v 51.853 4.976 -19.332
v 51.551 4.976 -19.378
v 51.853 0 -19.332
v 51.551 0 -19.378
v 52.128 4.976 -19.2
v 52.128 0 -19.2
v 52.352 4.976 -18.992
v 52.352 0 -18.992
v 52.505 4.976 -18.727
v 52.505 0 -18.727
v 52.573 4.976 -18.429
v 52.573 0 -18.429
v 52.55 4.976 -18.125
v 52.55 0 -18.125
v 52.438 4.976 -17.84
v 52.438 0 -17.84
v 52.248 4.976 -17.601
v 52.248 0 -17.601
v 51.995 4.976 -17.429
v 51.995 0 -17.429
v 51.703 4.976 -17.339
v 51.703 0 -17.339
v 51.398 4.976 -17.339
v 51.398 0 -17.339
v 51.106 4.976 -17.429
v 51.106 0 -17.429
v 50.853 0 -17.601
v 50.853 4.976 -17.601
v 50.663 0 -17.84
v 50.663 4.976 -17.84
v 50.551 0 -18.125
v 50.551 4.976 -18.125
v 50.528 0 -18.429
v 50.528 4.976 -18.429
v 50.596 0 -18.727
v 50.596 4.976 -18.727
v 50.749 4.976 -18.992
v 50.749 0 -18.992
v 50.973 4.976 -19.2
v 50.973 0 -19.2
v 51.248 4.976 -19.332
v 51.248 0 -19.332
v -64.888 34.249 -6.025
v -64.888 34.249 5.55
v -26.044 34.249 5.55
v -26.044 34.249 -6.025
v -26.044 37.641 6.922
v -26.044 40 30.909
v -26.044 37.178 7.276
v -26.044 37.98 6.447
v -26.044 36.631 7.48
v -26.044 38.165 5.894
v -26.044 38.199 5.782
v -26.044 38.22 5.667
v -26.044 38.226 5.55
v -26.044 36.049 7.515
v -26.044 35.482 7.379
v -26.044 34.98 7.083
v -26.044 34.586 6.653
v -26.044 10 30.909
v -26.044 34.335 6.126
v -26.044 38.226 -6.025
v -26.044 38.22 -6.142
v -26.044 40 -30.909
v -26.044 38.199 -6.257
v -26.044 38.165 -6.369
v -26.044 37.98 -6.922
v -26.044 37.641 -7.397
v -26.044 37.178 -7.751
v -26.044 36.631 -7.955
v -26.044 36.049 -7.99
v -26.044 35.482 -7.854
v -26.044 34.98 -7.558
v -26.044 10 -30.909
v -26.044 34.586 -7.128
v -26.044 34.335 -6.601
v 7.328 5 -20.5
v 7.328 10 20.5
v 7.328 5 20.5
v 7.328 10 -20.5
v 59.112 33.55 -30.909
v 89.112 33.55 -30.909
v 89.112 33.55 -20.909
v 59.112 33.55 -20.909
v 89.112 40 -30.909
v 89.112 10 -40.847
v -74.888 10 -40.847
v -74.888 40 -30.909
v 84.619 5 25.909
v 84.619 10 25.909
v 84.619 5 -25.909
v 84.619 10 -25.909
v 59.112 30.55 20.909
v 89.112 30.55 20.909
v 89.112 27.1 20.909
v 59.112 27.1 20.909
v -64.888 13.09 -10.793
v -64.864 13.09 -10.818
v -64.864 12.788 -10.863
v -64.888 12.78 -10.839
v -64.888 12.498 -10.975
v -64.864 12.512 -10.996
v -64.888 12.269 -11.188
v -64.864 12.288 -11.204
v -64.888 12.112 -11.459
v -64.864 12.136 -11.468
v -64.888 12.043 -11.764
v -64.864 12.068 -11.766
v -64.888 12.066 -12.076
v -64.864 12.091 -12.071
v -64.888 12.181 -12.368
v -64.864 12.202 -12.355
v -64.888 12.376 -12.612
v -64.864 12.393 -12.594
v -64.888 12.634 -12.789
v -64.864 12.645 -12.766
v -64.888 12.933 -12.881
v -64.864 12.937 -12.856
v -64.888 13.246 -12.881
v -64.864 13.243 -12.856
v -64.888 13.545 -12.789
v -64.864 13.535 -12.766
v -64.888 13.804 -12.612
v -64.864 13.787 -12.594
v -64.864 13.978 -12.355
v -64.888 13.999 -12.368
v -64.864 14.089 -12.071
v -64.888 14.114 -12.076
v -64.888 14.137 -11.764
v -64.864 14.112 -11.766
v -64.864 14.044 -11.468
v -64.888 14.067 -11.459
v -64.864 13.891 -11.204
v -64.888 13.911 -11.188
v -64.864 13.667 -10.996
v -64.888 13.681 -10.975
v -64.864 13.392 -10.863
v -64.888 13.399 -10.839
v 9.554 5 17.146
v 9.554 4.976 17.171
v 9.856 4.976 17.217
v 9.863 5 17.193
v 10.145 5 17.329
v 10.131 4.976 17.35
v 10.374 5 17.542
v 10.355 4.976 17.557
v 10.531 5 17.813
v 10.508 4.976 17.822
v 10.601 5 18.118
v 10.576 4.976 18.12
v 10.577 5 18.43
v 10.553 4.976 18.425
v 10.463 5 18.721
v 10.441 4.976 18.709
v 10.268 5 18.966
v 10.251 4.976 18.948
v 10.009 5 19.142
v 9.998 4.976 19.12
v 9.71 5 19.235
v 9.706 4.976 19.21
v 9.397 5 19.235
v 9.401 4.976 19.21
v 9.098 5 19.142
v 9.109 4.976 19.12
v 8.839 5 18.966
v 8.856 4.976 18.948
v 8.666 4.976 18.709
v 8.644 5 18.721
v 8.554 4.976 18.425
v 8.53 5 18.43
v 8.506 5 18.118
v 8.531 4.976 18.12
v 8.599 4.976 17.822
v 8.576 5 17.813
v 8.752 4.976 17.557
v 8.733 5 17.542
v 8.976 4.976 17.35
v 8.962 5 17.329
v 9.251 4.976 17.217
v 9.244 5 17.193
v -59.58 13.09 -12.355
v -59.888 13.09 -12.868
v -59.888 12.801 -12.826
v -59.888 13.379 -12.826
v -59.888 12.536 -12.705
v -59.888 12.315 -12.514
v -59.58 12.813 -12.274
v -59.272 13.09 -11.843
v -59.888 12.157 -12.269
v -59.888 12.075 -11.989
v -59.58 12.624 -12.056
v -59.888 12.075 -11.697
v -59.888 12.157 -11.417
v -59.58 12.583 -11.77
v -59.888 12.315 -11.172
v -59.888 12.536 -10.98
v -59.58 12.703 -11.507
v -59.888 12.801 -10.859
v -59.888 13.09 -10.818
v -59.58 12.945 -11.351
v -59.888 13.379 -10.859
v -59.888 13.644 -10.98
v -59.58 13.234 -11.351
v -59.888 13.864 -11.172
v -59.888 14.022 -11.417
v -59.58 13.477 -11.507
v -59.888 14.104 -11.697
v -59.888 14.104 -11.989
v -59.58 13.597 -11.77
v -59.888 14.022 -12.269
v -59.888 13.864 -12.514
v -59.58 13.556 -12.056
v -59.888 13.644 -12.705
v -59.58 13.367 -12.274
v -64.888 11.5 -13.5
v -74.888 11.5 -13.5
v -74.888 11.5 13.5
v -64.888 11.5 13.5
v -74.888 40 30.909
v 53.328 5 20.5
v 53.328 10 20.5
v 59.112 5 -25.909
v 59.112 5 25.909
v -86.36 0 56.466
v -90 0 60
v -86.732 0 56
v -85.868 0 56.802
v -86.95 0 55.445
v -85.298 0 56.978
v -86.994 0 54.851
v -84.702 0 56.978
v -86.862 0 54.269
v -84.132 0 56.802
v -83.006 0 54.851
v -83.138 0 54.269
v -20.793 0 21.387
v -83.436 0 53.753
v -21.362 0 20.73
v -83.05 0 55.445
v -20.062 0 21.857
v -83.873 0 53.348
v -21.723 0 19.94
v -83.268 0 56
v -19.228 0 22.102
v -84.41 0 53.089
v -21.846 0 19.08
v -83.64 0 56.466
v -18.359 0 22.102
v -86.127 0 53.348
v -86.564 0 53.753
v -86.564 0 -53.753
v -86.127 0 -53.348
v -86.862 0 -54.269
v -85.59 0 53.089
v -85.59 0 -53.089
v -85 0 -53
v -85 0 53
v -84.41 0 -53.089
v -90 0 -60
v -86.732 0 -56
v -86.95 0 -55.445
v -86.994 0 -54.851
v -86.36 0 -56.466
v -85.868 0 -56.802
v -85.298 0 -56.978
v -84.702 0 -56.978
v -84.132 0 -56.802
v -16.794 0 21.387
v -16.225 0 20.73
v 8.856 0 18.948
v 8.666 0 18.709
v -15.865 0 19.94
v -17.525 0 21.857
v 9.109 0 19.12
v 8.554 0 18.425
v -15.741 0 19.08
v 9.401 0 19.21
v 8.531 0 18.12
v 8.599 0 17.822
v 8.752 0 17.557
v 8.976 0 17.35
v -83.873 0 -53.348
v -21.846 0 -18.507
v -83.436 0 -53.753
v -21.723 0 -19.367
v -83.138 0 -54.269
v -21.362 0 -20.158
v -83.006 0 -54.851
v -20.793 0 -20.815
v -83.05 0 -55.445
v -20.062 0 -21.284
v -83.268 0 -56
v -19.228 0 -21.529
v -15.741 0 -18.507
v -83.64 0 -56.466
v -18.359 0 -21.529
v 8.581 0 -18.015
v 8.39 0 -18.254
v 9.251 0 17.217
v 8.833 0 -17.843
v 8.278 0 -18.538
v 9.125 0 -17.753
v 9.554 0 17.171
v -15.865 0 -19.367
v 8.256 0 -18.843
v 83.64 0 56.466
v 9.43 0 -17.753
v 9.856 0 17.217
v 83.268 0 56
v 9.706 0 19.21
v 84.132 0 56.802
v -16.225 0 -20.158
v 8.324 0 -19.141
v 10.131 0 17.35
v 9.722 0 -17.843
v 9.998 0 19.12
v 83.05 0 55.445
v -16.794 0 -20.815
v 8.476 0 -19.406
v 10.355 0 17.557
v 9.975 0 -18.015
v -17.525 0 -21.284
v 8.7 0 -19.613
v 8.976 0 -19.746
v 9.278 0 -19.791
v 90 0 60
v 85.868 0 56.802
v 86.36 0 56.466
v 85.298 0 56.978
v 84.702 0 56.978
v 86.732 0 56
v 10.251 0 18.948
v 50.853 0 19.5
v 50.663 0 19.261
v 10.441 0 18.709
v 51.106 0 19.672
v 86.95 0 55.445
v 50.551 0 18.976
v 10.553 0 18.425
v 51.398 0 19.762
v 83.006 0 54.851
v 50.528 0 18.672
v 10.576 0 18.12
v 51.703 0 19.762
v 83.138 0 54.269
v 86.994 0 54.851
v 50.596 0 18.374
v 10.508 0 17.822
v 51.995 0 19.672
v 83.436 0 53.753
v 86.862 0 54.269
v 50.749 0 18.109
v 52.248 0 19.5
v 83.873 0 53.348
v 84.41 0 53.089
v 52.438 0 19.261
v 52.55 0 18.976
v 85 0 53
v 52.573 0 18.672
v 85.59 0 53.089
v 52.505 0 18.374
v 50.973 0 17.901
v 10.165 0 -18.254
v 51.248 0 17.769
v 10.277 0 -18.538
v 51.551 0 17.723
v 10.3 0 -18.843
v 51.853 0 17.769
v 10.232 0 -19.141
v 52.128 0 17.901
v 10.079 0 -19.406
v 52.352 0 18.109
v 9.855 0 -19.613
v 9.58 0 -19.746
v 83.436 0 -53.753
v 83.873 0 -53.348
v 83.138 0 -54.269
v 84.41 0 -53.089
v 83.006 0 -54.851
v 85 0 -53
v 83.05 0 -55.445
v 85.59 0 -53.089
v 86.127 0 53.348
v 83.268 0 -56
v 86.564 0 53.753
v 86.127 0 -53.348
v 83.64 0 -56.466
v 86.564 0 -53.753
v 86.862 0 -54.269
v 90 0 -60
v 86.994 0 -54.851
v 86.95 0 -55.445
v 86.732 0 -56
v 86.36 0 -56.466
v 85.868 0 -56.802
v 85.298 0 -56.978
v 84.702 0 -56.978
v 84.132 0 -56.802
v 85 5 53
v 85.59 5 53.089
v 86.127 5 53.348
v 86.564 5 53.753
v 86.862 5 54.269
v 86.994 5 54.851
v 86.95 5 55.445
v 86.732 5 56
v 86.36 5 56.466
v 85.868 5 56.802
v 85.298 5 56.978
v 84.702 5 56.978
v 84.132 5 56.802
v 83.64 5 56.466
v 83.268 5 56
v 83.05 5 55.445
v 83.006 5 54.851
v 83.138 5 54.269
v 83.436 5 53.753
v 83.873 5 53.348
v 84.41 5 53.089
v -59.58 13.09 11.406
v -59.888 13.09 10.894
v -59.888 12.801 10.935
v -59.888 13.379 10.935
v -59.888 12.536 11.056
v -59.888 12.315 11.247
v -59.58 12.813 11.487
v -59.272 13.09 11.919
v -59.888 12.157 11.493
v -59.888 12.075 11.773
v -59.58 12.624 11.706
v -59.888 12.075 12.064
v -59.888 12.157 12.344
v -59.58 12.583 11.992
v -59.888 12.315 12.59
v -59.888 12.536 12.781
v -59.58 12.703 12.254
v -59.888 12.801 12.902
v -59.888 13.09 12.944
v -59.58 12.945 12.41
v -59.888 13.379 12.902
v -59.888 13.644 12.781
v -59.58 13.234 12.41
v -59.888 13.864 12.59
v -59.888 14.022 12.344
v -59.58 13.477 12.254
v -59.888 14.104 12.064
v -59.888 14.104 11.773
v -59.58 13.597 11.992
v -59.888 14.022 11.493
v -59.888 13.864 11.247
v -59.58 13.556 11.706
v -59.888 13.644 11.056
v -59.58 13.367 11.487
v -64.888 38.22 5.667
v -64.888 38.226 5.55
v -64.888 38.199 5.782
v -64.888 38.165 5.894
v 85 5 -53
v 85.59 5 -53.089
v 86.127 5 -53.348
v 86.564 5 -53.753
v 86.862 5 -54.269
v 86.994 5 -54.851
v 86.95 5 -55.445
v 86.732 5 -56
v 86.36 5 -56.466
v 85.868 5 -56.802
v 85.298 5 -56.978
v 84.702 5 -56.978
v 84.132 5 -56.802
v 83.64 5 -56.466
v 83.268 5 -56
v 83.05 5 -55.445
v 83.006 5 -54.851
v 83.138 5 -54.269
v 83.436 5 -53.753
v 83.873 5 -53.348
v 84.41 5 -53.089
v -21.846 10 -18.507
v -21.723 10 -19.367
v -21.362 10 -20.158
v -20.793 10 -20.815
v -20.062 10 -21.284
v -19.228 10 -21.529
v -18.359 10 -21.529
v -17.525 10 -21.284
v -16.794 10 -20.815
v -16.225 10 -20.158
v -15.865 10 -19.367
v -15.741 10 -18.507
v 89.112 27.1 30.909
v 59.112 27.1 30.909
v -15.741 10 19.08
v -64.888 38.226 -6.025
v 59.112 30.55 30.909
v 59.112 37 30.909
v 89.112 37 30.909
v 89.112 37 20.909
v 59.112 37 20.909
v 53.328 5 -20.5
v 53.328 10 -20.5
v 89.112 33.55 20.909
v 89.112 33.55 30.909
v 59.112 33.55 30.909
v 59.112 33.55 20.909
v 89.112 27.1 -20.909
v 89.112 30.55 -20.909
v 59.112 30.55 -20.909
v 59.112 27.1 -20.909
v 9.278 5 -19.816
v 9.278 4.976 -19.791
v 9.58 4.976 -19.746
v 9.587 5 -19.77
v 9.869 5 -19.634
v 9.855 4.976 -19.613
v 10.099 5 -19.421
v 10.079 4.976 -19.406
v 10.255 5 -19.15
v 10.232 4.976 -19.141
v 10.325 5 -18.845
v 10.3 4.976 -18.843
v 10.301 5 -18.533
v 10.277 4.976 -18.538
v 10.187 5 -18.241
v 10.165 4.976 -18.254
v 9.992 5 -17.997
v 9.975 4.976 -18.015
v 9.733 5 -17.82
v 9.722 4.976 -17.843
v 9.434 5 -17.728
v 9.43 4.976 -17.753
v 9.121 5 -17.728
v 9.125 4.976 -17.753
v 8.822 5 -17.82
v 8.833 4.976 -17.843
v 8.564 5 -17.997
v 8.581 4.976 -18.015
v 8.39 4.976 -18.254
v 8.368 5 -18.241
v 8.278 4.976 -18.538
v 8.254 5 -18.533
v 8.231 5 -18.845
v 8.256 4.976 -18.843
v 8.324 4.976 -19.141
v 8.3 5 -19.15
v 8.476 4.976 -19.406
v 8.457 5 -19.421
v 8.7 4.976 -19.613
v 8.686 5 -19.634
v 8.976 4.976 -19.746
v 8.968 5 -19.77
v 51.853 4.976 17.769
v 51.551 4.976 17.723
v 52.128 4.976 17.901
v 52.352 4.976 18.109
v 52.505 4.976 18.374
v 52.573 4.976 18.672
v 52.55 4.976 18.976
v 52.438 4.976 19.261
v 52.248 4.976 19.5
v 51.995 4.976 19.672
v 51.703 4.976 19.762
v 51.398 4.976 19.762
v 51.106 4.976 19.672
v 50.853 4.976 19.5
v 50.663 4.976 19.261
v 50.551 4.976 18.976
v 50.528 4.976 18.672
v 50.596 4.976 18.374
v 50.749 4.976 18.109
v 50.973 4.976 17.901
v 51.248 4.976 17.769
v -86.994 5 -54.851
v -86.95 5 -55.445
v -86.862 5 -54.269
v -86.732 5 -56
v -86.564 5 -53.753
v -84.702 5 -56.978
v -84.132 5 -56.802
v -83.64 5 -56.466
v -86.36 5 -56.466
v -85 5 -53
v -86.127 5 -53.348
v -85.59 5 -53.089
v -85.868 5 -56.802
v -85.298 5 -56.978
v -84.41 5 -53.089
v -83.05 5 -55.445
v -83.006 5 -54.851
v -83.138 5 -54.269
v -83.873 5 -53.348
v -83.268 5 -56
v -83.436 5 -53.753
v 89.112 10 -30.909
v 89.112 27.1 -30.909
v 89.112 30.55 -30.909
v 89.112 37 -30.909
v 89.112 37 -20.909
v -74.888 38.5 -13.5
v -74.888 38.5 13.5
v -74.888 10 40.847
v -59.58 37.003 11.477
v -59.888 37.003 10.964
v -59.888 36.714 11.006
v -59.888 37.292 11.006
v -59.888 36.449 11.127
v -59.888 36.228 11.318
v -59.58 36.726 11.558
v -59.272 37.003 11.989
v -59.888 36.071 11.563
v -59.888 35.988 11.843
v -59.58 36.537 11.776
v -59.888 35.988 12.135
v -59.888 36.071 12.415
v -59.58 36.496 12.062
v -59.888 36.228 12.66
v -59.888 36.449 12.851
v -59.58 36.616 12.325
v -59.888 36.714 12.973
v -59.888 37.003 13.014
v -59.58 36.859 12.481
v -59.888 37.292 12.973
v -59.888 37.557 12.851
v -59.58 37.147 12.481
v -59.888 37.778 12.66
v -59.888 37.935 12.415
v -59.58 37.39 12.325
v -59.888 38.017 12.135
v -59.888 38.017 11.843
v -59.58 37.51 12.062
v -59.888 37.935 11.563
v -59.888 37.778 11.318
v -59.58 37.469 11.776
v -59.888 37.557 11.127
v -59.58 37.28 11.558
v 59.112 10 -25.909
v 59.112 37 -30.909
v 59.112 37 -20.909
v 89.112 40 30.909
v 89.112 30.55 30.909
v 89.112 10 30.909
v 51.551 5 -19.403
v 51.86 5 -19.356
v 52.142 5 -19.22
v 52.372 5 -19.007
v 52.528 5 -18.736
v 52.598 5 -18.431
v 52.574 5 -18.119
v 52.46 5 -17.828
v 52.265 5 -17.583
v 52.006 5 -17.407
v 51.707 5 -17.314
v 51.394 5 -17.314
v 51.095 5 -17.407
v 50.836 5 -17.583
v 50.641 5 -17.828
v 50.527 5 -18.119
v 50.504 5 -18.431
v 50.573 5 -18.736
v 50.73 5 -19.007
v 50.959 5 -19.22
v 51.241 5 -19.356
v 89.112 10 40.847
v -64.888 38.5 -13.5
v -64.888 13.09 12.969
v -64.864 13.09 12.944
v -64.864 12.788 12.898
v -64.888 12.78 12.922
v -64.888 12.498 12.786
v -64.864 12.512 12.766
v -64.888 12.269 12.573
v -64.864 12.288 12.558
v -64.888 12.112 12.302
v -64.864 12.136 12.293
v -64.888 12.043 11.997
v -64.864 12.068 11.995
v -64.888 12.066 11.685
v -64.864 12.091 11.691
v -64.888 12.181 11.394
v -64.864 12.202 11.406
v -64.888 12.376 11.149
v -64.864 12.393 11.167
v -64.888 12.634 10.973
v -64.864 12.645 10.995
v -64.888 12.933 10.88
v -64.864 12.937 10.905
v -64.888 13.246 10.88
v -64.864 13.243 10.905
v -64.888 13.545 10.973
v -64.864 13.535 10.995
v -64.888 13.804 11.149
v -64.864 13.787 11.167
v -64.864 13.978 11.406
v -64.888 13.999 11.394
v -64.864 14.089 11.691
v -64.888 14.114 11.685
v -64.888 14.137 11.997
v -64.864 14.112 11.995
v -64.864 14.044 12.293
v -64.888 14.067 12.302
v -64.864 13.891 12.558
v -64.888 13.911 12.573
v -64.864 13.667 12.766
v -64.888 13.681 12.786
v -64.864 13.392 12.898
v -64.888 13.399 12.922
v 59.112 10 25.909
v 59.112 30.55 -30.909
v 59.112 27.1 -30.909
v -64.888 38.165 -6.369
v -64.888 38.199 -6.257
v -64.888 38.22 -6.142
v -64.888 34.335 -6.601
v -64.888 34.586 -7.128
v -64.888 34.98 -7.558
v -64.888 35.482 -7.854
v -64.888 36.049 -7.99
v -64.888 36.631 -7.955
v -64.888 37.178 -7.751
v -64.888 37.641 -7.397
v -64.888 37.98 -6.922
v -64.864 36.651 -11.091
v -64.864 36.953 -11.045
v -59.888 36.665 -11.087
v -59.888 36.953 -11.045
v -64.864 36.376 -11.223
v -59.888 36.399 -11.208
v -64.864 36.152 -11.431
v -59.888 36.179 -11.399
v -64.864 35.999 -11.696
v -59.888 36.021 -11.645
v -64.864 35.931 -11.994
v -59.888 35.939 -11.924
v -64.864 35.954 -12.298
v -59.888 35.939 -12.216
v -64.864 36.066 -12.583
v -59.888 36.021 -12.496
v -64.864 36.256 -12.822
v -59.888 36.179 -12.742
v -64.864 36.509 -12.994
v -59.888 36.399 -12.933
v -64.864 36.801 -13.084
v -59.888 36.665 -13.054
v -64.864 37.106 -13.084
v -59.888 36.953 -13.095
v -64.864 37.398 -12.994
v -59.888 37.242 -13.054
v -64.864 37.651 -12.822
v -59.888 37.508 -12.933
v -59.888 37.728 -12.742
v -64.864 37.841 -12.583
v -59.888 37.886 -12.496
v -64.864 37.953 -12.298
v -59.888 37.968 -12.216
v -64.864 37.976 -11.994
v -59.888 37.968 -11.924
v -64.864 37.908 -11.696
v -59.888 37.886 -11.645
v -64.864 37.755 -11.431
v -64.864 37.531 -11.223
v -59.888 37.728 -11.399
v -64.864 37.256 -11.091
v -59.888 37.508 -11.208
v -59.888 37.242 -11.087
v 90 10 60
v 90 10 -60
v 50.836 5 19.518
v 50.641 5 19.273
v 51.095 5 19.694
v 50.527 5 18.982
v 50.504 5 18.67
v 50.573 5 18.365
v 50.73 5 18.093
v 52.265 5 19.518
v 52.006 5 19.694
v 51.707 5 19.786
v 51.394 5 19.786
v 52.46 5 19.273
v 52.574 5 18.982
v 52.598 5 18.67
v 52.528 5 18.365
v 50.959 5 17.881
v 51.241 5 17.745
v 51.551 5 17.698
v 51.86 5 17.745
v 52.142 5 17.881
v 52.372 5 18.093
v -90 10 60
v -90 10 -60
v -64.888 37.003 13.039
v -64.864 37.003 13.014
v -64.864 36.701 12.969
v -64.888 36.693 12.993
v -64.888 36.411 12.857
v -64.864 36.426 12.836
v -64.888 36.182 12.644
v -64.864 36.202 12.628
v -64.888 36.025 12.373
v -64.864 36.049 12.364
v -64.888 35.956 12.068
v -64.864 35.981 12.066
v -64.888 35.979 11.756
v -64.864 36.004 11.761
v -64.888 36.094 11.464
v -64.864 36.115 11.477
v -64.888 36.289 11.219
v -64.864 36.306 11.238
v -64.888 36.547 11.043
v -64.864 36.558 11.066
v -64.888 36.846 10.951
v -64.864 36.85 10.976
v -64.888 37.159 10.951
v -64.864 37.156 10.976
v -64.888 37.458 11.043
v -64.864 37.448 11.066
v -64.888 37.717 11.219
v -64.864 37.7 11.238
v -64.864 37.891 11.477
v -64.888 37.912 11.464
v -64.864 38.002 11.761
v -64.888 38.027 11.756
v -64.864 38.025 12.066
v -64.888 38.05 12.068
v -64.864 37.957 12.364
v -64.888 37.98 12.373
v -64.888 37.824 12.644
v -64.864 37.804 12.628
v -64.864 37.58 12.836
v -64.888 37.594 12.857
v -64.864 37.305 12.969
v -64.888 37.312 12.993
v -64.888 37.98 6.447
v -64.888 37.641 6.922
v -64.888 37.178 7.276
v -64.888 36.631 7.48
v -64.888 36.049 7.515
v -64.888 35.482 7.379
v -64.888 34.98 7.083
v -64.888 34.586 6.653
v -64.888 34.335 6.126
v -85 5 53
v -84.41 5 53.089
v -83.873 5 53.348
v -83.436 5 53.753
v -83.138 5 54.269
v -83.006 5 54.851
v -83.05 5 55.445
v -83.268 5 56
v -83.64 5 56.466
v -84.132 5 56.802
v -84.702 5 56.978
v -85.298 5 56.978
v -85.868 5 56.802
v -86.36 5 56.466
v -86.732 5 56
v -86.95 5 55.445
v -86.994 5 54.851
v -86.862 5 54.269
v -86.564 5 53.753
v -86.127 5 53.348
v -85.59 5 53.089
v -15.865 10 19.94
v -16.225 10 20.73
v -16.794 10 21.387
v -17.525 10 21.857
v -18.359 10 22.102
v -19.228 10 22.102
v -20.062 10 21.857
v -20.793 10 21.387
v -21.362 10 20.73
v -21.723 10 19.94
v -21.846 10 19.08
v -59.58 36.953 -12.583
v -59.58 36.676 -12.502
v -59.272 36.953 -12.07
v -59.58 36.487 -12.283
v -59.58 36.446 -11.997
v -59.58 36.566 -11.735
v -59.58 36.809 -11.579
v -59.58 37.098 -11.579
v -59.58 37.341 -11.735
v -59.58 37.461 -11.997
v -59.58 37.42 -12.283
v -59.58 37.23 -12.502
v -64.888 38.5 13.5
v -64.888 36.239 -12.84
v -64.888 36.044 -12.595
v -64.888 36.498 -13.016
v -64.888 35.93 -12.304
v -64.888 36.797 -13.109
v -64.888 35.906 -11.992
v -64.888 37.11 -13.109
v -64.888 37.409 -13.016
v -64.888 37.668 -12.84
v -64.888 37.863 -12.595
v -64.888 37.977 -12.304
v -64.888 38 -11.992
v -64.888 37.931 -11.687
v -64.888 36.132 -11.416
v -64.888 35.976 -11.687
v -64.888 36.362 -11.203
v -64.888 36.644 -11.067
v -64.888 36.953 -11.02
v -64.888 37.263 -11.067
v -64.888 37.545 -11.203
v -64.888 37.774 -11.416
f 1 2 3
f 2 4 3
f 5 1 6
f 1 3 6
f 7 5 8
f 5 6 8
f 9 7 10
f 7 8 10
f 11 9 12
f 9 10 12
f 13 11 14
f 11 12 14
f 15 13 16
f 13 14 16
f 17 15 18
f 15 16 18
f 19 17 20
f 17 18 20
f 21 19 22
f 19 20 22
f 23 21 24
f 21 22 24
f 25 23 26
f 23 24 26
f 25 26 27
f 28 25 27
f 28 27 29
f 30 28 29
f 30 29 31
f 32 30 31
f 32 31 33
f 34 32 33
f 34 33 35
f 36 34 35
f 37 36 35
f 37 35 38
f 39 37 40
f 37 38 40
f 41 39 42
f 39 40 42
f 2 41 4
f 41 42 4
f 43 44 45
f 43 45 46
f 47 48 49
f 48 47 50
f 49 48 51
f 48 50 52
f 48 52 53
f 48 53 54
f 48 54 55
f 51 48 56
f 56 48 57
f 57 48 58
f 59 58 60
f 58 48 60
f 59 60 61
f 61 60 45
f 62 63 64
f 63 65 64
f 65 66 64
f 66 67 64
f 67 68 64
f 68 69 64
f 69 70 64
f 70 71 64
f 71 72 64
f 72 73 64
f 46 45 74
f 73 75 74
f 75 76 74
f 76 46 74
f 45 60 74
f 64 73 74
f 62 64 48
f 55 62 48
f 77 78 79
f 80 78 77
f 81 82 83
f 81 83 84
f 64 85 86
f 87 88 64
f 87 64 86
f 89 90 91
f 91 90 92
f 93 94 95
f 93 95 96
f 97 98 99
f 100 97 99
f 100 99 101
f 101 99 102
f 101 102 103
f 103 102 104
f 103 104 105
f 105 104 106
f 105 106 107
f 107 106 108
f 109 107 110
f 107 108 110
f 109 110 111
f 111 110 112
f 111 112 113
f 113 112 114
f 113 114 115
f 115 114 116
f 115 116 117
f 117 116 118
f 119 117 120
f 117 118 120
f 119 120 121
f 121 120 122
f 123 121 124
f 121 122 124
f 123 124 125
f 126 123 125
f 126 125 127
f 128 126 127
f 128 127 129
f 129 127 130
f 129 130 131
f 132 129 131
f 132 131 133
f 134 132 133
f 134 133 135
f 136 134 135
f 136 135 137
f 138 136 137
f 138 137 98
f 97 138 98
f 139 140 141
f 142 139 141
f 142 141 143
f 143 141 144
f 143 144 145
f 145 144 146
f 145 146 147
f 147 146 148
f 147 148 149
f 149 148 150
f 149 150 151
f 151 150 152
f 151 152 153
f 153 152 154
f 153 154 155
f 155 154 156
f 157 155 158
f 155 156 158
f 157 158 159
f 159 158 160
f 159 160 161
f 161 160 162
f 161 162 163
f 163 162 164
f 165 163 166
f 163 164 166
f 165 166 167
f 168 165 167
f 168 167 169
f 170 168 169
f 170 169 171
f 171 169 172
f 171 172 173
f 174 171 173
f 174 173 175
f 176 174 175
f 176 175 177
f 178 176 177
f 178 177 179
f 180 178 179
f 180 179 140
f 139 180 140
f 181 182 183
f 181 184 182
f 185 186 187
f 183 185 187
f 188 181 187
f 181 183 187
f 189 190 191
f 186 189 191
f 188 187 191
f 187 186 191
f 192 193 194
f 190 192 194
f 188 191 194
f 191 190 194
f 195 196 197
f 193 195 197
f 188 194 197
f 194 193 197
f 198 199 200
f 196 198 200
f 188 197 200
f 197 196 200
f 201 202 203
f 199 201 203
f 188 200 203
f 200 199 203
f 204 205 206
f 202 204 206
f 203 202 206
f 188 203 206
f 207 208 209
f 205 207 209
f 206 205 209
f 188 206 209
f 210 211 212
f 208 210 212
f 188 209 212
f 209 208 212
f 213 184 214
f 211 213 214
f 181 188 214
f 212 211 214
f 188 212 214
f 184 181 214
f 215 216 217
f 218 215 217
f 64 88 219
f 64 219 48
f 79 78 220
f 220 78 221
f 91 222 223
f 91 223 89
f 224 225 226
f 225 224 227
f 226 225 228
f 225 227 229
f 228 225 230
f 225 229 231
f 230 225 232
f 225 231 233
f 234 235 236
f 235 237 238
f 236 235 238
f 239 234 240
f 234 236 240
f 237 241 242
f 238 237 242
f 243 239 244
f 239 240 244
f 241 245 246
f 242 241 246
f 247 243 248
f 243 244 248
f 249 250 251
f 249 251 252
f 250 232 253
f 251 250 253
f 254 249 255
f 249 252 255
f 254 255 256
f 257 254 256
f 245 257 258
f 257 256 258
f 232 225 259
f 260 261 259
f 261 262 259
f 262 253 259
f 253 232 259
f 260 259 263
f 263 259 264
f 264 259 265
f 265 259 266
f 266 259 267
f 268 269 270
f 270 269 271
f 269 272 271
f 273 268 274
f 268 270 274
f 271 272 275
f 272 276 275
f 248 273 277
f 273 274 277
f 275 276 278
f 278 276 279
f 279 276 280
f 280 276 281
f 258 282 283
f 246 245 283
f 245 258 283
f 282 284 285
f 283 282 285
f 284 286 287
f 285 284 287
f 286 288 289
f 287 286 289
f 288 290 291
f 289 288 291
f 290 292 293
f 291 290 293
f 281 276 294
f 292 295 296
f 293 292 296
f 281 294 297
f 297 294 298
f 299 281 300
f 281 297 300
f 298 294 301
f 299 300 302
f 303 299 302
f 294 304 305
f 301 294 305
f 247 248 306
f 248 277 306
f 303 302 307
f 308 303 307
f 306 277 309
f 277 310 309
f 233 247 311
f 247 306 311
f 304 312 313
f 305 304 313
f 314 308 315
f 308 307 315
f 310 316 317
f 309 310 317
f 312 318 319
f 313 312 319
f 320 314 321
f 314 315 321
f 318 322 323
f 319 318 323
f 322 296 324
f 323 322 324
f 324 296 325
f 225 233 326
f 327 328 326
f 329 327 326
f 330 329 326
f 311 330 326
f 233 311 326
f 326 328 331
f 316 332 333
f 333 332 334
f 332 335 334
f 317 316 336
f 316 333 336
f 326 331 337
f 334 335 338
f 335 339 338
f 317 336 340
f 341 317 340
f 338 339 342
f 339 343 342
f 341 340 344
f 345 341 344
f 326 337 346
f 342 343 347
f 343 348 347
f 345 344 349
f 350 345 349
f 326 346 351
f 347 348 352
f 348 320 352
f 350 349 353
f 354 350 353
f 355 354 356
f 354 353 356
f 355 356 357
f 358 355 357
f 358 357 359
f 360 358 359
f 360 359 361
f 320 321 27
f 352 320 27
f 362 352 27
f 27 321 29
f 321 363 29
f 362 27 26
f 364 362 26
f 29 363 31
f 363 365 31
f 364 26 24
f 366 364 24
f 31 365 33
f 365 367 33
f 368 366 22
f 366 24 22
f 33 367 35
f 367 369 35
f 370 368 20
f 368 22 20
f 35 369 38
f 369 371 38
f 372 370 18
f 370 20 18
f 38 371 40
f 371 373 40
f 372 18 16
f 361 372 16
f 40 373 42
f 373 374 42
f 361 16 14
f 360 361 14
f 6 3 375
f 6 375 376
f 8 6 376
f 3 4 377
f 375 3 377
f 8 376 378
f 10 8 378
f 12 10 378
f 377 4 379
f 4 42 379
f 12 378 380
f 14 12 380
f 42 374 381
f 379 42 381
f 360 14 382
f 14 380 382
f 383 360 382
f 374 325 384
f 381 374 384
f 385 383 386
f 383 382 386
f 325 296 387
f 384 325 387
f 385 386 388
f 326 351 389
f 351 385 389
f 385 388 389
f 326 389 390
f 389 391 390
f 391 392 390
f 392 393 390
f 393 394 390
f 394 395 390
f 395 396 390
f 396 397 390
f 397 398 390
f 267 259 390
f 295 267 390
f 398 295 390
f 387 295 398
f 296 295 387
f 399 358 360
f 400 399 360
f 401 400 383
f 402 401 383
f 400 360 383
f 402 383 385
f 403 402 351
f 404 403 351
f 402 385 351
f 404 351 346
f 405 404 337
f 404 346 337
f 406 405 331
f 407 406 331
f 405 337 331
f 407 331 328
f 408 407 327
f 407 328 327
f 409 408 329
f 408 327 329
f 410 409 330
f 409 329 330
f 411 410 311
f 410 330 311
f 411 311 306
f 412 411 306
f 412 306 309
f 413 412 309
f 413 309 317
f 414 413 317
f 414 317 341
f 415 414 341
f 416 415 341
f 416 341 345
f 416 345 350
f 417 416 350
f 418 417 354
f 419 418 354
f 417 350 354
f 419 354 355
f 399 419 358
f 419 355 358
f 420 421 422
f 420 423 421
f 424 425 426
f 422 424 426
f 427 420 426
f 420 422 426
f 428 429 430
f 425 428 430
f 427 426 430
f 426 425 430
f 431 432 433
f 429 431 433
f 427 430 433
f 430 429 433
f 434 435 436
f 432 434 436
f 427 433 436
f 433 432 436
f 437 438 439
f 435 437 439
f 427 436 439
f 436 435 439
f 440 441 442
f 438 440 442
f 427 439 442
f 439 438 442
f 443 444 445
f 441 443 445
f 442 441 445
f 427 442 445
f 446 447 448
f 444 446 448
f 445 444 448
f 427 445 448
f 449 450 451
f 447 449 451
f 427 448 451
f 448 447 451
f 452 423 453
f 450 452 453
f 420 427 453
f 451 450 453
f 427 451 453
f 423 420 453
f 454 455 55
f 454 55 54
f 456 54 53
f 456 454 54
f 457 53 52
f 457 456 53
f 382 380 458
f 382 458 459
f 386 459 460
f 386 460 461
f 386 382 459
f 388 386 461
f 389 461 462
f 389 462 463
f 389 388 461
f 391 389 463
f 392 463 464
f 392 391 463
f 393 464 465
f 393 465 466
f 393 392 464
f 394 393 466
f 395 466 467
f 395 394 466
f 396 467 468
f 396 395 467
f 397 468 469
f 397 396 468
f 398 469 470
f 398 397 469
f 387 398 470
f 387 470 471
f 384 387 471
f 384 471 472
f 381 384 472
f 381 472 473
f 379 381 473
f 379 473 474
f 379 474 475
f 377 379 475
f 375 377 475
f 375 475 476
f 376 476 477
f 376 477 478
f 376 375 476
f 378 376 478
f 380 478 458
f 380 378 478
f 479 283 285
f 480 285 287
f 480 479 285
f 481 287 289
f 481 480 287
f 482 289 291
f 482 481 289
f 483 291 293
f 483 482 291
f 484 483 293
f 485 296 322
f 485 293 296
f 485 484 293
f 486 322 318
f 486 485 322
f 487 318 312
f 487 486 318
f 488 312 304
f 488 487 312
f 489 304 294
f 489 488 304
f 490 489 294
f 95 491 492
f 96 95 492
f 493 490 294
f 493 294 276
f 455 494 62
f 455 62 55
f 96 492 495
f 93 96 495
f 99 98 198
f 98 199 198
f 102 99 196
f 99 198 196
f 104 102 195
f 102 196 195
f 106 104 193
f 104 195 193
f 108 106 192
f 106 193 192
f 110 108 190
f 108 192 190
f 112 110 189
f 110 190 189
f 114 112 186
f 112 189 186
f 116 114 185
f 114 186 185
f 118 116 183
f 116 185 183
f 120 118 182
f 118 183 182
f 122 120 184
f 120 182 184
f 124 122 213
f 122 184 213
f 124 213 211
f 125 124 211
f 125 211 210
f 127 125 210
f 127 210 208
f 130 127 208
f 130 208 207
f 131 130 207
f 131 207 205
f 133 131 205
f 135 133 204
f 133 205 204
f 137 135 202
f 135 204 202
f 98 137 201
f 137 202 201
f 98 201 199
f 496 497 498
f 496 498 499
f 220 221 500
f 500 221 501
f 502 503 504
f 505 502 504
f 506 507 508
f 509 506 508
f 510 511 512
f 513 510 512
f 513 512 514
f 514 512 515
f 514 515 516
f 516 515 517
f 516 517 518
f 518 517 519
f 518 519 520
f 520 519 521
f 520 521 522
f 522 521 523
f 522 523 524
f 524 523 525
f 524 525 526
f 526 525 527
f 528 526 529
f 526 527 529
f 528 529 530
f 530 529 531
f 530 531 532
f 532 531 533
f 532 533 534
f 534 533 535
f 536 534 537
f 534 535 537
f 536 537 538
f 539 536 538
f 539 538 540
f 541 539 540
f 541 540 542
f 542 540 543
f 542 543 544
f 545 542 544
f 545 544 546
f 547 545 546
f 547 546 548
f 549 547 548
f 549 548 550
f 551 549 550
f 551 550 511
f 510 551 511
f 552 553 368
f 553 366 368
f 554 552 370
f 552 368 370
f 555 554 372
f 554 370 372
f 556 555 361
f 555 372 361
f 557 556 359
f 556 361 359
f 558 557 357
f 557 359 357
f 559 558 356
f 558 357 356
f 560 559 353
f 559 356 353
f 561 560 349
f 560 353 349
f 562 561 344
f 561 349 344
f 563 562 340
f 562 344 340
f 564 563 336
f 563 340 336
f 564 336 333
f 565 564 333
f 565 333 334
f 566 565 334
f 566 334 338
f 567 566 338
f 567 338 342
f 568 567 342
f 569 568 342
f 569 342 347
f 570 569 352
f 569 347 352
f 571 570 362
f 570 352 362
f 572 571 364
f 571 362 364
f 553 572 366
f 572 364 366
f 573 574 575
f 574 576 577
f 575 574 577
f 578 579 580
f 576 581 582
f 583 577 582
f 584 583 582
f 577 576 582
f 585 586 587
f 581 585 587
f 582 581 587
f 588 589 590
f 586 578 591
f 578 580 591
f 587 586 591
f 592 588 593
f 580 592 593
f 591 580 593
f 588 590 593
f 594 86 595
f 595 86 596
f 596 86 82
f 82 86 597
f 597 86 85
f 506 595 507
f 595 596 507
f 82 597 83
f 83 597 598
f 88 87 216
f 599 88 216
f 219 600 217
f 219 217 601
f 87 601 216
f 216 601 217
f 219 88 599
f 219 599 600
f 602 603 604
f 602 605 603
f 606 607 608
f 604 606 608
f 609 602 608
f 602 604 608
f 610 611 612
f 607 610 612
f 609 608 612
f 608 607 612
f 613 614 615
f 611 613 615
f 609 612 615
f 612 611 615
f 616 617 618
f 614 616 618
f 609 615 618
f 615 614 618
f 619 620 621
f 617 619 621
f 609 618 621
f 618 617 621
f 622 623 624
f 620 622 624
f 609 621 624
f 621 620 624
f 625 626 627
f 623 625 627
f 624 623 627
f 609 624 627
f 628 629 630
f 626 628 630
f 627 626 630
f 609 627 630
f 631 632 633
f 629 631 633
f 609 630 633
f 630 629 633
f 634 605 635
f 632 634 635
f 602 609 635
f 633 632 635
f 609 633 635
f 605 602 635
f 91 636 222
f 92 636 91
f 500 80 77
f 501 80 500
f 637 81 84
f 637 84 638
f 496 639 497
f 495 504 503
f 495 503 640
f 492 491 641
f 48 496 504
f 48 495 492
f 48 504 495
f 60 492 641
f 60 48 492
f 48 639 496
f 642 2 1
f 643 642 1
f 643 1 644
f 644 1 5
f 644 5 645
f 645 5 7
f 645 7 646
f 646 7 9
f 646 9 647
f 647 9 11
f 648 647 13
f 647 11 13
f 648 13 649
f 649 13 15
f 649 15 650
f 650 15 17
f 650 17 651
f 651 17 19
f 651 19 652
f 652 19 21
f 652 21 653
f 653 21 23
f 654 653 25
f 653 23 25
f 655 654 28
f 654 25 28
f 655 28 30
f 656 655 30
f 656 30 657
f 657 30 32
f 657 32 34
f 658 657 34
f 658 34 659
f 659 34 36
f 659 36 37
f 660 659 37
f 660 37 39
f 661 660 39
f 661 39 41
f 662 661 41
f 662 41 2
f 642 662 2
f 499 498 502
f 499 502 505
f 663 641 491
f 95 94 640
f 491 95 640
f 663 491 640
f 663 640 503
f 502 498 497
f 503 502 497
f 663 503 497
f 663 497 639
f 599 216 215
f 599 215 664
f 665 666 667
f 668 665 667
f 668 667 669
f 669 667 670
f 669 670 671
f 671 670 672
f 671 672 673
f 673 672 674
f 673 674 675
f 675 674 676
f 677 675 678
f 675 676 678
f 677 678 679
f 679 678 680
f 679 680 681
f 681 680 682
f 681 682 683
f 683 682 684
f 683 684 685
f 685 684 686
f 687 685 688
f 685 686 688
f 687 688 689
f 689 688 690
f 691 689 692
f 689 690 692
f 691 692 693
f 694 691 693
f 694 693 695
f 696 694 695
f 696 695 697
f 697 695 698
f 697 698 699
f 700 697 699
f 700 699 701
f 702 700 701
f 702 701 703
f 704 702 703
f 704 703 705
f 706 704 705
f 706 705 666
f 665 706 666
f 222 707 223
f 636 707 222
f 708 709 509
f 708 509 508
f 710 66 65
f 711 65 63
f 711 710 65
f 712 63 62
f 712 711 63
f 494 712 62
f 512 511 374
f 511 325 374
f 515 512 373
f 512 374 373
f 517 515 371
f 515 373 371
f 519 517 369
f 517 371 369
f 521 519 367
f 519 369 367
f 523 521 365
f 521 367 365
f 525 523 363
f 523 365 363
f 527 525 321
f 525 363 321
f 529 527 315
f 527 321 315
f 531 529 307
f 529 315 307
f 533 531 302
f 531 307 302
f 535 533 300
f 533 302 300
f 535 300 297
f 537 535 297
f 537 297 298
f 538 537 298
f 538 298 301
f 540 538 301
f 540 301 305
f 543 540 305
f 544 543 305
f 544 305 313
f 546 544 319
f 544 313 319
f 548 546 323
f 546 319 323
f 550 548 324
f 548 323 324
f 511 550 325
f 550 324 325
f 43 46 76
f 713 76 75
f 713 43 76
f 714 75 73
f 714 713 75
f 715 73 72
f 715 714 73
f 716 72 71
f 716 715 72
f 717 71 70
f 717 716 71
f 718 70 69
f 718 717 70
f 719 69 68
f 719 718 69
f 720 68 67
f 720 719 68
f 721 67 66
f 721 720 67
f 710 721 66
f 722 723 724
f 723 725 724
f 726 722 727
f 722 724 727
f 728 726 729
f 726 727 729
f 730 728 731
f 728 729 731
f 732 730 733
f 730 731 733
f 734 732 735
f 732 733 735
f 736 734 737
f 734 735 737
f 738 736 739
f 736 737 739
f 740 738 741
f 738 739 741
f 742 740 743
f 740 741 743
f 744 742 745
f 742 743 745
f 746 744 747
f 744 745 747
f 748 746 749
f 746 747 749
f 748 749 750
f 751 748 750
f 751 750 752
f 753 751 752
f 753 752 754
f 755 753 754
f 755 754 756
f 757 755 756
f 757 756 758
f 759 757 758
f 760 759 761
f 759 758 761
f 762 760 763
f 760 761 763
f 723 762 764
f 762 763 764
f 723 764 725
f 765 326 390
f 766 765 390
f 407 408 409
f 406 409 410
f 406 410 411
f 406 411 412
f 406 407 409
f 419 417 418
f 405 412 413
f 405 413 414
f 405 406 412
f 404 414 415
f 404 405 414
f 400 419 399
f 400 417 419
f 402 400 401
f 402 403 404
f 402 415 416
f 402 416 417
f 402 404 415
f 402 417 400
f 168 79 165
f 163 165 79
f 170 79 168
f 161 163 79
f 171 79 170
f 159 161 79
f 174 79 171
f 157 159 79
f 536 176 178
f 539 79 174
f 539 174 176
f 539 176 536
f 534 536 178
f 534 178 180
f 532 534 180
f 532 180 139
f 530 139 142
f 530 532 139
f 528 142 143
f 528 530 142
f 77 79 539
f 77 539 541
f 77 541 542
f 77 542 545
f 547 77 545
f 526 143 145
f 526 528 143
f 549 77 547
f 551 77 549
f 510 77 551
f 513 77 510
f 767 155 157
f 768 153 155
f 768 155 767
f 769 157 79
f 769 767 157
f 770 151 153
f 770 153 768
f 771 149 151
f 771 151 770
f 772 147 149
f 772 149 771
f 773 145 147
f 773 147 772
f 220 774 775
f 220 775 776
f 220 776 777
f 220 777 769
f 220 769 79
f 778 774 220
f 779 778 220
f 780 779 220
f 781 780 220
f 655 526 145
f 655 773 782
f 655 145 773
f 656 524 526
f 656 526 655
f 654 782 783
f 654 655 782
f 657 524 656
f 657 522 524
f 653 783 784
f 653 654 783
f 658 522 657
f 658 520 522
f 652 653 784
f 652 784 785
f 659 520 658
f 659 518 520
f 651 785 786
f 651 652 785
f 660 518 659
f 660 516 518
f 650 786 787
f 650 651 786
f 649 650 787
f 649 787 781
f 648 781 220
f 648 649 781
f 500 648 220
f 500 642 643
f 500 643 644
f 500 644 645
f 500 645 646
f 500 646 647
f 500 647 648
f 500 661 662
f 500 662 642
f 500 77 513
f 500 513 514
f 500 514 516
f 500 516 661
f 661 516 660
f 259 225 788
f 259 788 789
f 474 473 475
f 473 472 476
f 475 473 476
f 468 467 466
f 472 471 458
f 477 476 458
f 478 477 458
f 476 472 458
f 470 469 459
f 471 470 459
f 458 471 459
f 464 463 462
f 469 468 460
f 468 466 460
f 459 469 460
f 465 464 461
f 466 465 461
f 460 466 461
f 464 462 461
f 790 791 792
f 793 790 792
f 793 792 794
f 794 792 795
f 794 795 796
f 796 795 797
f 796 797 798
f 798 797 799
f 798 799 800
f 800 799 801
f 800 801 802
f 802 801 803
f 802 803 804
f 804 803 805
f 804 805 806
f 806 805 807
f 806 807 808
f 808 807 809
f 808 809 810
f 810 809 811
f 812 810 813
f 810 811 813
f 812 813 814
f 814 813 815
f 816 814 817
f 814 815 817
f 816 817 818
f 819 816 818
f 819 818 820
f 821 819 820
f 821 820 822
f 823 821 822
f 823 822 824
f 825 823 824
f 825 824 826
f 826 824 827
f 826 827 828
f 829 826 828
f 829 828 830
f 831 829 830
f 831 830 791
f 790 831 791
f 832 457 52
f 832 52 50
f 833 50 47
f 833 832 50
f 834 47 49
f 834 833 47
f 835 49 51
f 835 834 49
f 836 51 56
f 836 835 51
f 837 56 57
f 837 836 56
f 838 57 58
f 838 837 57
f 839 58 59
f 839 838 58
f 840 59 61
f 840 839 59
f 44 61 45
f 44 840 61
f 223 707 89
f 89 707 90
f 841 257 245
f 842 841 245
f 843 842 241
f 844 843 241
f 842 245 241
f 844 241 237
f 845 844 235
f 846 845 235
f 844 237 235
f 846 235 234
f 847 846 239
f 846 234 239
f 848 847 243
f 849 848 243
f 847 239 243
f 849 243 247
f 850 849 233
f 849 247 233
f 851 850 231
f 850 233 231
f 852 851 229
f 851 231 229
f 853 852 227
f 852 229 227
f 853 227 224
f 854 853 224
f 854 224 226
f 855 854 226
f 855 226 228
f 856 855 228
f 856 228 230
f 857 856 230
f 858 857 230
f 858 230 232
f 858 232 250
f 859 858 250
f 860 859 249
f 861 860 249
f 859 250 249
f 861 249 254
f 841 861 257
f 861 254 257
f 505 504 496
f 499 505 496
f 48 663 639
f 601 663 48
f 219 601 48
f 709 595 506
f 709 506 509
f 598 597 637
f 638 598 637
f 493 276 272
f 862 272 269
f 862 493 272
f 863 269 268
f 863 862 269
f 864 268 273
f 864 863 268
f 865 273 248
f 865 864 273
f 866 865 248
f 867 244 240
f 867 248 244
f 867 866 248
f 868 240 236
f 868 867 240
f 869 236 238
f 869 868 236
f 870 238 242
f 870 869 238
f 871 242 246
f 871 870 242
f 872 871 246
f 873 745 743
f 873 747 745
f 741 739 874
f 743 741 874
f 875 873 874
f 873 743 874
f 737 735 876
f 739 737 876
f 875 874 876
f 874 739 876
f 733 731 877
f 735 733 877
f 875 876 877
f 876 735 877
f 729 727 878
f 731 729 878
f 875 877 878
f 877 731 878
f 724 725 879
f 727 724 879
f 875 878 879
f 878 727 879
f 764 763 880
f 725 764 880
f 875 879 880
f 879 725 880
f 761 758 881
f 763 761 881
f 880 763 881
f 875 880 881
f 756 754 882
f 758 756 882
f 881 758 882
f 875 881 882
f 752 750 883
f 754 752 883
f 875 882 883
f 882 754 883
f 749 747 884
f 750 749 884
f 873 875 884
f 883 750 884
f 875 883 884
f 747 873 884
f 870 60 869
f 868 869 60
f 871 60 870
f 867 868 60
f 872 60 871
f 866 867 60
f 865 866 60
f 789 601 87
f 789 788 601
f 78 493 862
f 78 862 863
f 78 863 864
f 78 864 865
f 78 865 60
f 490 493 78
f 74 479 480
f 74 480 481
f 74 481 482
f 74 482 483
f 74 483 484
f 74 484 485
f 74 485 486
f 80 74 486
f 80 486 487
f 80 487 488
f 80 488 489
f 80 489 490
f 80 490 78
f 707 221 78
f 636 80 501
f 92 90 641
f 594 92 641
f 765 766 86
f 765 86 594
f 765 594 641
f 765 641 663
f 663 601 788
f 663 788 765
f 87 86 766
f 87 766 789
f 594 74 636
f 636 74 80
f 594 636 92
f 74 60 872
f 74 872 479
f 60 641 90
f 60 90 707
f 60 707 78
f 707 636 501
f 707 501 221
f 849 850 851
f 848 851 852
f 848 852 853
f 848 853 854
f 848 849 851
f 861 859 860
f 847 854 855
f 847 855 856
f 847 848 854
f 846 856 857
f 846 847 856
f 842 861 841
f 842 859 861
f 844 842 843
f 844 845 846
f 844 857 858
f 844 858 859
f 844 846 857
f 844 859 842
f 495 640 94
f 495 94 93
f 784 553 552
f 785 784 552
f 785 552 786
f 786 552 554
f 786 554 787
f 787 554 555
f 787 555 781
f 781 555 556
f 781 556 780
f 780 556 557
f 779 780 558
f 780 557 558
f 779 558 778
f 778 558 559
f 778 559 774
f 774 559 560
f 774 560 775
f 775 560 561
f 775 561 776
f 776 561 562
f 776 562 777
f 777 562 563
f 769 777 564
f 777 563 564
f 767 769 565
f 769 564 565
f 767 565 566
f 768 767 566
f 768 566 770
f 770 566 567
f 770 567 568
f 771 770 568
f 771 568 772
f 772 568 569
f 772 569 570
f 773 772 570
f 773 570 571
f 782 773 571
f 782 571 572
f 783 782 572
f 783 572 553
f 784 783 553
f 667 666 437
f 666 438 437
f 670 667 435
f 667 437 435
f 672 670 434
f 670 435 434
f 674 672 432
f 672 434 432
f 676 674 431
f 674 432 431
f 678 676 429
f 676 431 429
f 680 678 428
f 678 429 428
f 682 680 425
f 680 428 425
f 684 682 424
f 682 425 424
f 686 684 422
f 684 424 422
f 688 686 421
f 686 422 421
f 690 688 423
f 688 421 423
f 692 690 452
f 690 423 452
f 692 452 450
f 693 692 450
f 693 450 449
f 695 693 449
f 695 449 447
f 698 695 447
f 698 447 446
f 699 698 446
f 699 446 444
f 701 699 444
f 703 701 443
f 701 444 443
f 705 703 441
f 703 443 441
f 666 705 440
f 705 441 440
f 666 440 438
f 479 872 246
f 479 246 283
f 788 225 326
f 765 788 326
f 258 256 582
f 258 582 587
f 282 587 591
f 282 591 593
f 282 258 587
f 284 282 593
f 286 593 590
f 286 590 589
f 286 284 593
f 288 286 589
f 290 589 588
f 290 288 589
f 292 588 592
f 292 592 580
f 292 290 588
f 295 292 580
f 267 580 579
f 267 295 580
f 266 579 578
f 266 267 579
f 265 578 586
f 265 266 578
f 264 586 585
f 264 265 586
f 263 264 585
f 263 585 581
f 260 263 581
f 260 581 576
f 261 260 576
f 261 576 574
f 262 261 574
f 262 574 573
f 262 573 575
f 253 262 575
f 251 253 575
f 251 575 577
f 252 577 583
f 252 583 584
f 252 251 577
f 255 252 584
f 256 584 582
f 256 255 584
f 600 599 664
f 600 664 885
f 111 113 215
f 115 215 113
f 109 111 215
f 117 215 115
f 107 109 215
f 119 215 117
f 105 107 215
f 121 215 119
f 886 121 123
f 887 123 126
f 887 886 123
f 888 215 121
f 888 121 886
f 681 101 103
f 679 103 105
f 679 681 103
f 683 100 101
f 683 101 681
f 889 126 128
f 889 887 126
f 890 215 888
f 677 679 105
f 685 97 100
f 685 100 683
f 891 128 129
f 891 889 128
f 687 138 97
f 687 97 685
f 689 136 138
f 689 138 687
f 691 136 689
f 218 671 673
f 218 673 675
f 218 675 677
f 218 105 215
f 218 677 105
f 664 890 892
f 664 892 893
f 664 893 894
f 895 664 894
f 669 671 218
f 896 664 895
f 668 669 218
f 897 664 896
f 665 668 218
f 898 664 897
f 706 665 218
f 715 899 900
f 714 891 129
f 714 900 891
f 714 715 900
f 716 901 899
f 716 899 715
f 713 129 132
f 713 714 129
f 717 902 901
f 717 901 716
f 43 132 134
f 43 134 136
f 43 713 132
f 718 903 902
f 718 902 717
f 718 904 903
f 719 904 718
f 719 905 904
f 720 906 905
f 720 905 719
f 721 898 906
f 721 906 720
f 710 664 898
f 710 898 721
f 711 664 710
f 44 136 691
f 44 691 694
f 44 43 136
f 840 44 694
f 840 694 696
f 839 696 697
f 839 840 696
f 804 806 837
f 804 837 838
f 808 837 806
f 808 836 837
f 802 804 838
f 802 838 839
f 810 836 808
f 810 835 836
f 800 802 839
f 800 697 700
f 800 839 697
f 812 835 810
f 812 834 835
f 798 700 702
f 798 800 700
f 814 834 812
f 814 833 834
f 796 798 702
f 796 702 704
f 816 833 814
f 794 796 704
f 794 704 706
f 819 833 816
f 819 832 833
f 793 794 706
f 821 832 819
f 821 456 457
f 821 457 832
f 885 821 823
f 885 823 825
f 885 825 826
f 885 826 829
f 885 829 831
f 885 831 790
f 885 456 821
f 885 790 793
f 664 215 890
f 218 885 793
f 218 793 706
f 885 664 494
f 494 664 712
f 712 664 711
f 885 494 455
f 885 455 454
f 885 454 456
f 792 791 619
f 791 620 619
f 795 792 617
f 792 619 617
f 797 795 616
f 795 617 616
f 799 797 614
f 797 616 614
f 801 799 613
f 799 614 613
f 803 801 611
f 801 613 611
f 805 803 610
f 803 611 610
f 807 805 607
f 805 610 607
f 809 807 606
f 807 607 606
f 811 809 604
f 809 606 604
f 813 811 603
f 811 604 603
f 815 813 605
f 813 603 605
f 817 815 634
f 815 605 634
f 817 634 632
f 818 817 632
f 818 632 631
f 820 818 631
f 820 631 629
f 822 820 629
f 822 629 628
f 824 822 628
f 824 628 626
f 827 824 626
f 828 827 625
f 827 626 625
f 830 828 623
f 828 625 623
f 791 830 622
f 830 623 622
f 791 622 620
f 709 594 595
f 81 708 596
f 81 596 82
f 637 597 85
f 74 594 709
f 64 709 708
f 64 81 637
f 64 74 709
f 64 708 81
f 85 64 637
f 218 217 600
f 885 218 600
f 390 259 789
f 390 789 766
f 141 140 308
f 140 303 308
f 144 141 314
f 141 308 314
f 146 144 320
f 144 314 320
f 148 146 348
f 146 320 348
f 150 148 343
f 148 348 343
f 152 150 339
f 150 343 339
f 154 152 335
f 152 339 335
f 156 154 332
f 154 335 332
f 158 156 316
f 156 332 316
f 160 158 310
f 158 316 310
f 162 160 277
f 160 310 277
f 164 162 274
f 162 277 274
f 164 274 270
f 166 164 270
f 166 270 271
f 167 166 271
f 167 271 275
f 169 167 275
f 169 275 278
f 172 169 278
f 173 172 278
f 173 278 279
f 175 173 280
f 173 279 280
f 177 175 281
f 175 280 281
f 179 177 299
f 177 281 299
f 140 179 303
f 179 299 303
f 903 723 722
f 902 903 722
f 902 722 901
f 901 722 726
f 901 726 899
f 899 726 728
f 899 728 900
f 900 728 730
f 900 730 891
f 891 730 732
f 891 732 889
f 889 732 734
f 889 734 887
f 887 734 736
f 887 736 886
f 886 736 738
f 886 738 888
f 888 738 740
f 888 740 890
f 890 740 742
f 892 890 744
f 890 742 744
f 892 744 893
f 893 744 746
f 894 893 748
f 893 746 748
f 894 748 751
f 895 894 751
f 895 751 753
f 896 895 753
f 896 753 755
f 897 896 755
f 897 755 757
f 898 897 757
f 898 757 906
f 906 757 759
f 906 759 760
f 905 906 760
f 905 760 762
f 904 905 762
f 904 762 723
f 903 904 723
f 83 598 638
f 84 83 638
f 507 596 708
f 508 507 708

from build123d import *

# Parameters (mm, degrees)
SKETCH1_W                           = 180
SKETCH1_H                           = 120
BOSS_EXTRUDE1_DEPTH                 = 10
SKETCH2_W                           = 48.844317462
SKETCH2_H                           = 61.818589288
BOSS_EXTRUDE2_DEPTH                 = 30
SKETCH3_W                           = 27
SKETCH3_H                           = 27
CUT_EXTRUDE1_DEPTH                  = 10
CUT_EXTRUDE5_DEPTH                  = 171.851904114
TAP_DRILL_FOR_M2_5_TAP1_D           = 2.05
TAP_DRILL_FOR_M2_5_TAP1_DEPTH       = 5
TAP_DRILL_FOR_M2_5_TAP1_CSINK_D     = 2.1
TAP_DRILL_FOR_M2_5_TAP1_CSINK_ANGLE = 92
TAP_DRILL_FOR_M2_5_TAP1_TIP         = 0.615882135
CUT_EXTRUDE6_DEPTH                  = 113.249721603
BOSS_EXTRUDE3_DEPTH                 = 49
SKETCH14_W                          = 46
SKETCH14_H                          = 41
CUT_EXTRUDE8_DEPTH                  = 5
TAP_DRILL_FOR_M2_5_TAP2_D           = 2.05
TAP_DRILL_FOR_M2_5_TAP2_DEPTH       = 5
TAP_DRILL_FOR_M2_5_TAP2_CSINK_D     = 2.1
TAP_DRILL_FOR_M2_5_TAP2_CSINK_ANGLE = 92
TAP_DRILL_FOR_M2_5_TAP2_TIP         = 0.615882135
BOSS_EXTRUDE5_DEPTH                 = 115
BOSS_EXTRUDE6_DEPTH                 = 115
SKETCH29_W                          = 30
SKETCH29_H                          = 3.45
BOSS_EXTRUDE10_DEPTH                = 10
SKETCH34_R                          = 2
CUT_EXTRUDE10_DEPTH                 = 5
SKETCH25_R                          = 2
CUT_EXTRUDE11_DEPTH                 = 5
SKETCH36_W                          = 25.507224214
SKETCH36_H                          = 51.818589288
CUT_EXTRUDE12_DEPTH                 = 5
CUT_EXTRUDE14_DEPTH                 = 171.851904114


with BuildPart() as part:
    # Sketch1 → Boss-Extrude1 (new body)
    with BuildSketch(Plane(origin=(0, 0, 0), x_dir=(1, 0, 0), z_dir=(0, 1, 0))):
        Rectangle(SKETCH1_W, SKETCH1_H)
    extrude(amount=BOSS_EXTRUDE1_DEPTH)

    # Sketch2 → Boss-Extrude2 (add)
    with BuildSketch(Plane(origin=(0, 10, 0), x_dir=(1, 0, 0), z_dir=(0, 1, 0))):
        with Locations((-50.466101441, 0)):
            Rectangle(SKETCH2_W, SKETCH2_H)
    extrude(amount=BOSS_EXTRUDE2_DEPTH)

    # Sketch3 → Cut-Extrude1 (cut)
    with BuildSketch(Plane.ZY.offset(74.888260172)):
        with Locations((0, 25)):
            Rectangle(SKETCH3_W, SKETCH3_H)
    extrude(amount=-CUT_EXTRUDE1_DEPTH, mode=Mode.SUBTRACT)

    # Sketch4 → Cut-Extrude5 (cut, through all)
    with BuildSketch(Plane.ZY.offset(64.888260172)):
        with BuildLine():
            Line((-6.024531525, 38.226394973), (5.549516036, 38.226394973))
            ThreePointArc((5.549516036, 38.226394973), (6.551598076, 37.224312933), (5.549516036, 36.222230893))
            Line((5.549516036, 36.222230893), (-6.024531525, 36.222230893))
            ThreePointArc((-6.024531525, 36.222230893), (-7.026613565, 37.224312933), (-6.024531525, 38.226394973))
        make_face()
    extrude(amount=-CUT_EXTRUDE5_DEPTH, mode=Mode.SUBTRACT)

    # Tap Drill for M2.5 Tap1
    with Locations(Plane(origin=(-64.888260172, 36.953397965, -12.070360422), x_dir=(0, 0, -1), z_dir=(-1, 0, 0))):
        with Locations((0, 0), (-24.059553717, -0.049505255), (-23.988973263, 23.863567836), (-0.227588633, 23.863567836)):
            CounterSinkHole(TAP_DRILL_FOR_M2_5_TAP1_D / 2, TAP_DRILL_FOR_M2_5_TAP1_CSINK_D / 2, depth=TAP_DRILL_FOR_M2_5_TAP1_DEPTH, counter_sink_angle=TAP_DRILL_FOR_M2_5_TAP1_CSINK_ANGLE)
            with Locations((0, 0, -(TAP_DRILL_FOR_M2_5_TAP1_DEPTH + TAP_DRILL_FOR_M2_5_TAP1_TIP / 2))):  # 118° drill point
                Cone(0, TAP_DRILL_FOR_M2_5_TAP1_D / 2, TAP_DRILL_FOR_M2_5_TAP1_TIP, mode=Mode.SUBTRACT)

    # Sketch9 → Cut-Extrude6 (cut, through all)
    with BuildSketch(Plane(origin=(0, 10, 0), x_dir=(1, 0, 0), z_dir=(0, 1, 0))):
        with BuildLine():
            Line((-21.846384178, -19.079811509), (-21.846384178, 18.507417164))
            ThreePointArc((-21.846384178, 18.507417164), (-18.793614336, 21.560187005), (-15.740844495, 18.507417164))
            Line((-15.740844495, 18.507417164), (-15.740844495, -19.079811509))
            ThreePointArc((-15.740844495, -19.079811509), (-18.793614336, -22.13258135), (-21.846384178, -19.079811509))
        make_face()
    extrude(amount=-CUT_EXTRUDE6_DEPTH, mode=Mode.SUBTRACT)

    # Sketch10 → Boss-Extrude3 (add)
    with BuildSketch(Plane.ZY.offset(74.888260172)):
        Polygon((30.909294644, 10), (30.909294644, 40), (40.847177304, 10), align=None)
    boss_extrude3 = extrude(amount=-BOSS_EXTRUDE3_DEPTH)

    # Mirror2: Boss-Extrude3 across plane
    add(boss_extrude3.mirror(Plane.XY))

    # Sketch14 → Cut-Extrude8 (cut)
    with BuildSketch(Plane(origin=(0, 10, 0), x_dir=(1, 0, 0), z_dir=(0, 1, 0))):
        with Locations((30.328073167, 0)):
            Rectangle(SKETCH14_W, SKETCH14_H)
    extrude(amount=-CUT_EXTRUDE8_DEPTH, mode=Mode.SUBTRACT)

    # Tap Drill for M2.5 Tap2
    with Locations(Plane(origin=(9.553554548, 5, 18.196456661), x_dir=(0, 0, 1), z_dir=(0, 1, 0))):
        with Locations((0, 0), (-36.962901754, -0.27584255), (-36.549137929, 41.997028299), (0.551685101, 41.997028299)):
            CounterSinkHole(TAP_DRILL_FOR_M2_5_TAP2_D / 2, TAP_DRILL_FOR_M2_5_TAP2_CSINK_D / 2, depth=TAP_DRILL_FOR_M2_5_TAP2_DEPTH, counter_sink_angle=TAP_DRILL_FOR_M2_5_TAP2_CSINK_ANGLE)
            with Locations((0, 0, -(TAP_DRILL_FOR_M2_5_TAP2_DEPTH + TAP_DRILL_FOR_M2_5_TAP2_TIP / 2))):  # 118° drill point
                Cone(0, TAP_DRILL_FOR_M2_5_TAP2_D / 2, TAP_DRILL_FOR_M2_5_TAP2_TIP, mode=Mode.SUBTRACT)

    # Sketch18 → Boss-Extrude5 (add)
    with BuildSketch(Plane(origin=(-25.888260172, 0, 0), x_dir=(0, 0, -1), z_dir=(1, 0, 0))):
        Polygon((40.847177304, 10), (30.909294644, 10), (30.909294644, 40), align=None)
    extrude(amount=BOSS_EXTRUDE5_DEPTH)

    # Sketch19 → Boss-Extrude6 (add)
    with BuildSketch(Plane(origin=(-25.888260172, 0, 0), x_dir=(0, 0, -1), z_dir=(1, 0, 0))):
        Polygon((-30.909294644, 10), (-40.847177304, 10), (-30.909294644, 40), align=None)
    extrude(amount=BOSS_EXTRUDE6_DEPTH)

    # Sketch29 → Boss-Extrude10 (add)
    with BuildSketch(Plane(origin=(0, 0, 30.909294644), x_dir=(-1, 0, 0), z_dir=(0, 0, -1))):
        with Locations((-74.111739828, 35.275)):
            Rectangle(SKETCH29_W, SKETCH29_H)
        with Locations((-74.111739828, 28.825)):
            Rectangle(SKETCH29_W, SKETCH29_H)
    boss_extrude10 = extrude(amount=BOSS_EXTRUDE10_DEPTH)

    # Mirror3: Boss-Extrude10 across plane
    add(boss_extrude10.mirror(Plane.XY))

    # Sketch34 → Cut-Extrude10 (cut)
    with BuildSketch(Plane.XZ):
        with Locations(Location((-85, 55, 0), (0, 0, 270))):
            Circle(SKETCH34_R)
    cut_extrude10 = extrude(amount=-CUT_EXTRUDE10_DEPTH, mode=Mode.SUBTRACT)

    # Sketch25 → Cut-Extrude11 (cut)
    with BuildSketch(Plane.XZ):
        with Locations(Location((85, 55, 0), (0, 0, 270))):
            Circle(SKETCH25_R)
    cut_extrude11 = extrude(amount=-CUT_EXTRUDE11_DEPTH, mode=Mode.SUBTRACT)

    # Mirror4: Cut-Extrude10, Cut-Extrude11 across plane
    add(cut_extrude10.mirror(Plane.XY), mode=Mode.SUBTRACT)
    add(cut_extrude11.mirror(Plane.XY), mode=Mode.SUBTRACT)

    # Sketch36 → Cut-Extrude12 (cut)
    with BuildSketch(Plane(origin=(0, 10, 0), x_dir=(1, 0, 0), z_dir=(0, 1, 0))):
        with Locations((71.865351935, 0)):
            Rectangle(SKETCH36_W, SKETCH36_H)
    extrude(amount=-CUT_EXTRUDE12_DEPTH, mode=Mode.SUBTRACT)

    # Sketch39 → Cut-Extrude14 (cut, through all)
    with BuildSketch(Plane.ZY.offset(64.888260172)):
        with BuildLine():
            Line((-6.024531525, 38.195576912), (5.549516036, 38.195576912))
            ThreePointArc((5.549516036, 38.195576912), (7.522862055, 36.222230893), (5.549516036, 34.248884873))
            Line((5.549516036, 34.248884873), (-6.024531525, 34.248884873))
            ThreePointArc((-6.024531525, 34.248884873), (-7.997877545, 36.222230893), (-6.024531525, 38.195576912))
        make_face()
    extrude(amount=-CUT_EXTRUDE14_DEPTH, mode=Mode.SUBTRACT)


solid = part.part
